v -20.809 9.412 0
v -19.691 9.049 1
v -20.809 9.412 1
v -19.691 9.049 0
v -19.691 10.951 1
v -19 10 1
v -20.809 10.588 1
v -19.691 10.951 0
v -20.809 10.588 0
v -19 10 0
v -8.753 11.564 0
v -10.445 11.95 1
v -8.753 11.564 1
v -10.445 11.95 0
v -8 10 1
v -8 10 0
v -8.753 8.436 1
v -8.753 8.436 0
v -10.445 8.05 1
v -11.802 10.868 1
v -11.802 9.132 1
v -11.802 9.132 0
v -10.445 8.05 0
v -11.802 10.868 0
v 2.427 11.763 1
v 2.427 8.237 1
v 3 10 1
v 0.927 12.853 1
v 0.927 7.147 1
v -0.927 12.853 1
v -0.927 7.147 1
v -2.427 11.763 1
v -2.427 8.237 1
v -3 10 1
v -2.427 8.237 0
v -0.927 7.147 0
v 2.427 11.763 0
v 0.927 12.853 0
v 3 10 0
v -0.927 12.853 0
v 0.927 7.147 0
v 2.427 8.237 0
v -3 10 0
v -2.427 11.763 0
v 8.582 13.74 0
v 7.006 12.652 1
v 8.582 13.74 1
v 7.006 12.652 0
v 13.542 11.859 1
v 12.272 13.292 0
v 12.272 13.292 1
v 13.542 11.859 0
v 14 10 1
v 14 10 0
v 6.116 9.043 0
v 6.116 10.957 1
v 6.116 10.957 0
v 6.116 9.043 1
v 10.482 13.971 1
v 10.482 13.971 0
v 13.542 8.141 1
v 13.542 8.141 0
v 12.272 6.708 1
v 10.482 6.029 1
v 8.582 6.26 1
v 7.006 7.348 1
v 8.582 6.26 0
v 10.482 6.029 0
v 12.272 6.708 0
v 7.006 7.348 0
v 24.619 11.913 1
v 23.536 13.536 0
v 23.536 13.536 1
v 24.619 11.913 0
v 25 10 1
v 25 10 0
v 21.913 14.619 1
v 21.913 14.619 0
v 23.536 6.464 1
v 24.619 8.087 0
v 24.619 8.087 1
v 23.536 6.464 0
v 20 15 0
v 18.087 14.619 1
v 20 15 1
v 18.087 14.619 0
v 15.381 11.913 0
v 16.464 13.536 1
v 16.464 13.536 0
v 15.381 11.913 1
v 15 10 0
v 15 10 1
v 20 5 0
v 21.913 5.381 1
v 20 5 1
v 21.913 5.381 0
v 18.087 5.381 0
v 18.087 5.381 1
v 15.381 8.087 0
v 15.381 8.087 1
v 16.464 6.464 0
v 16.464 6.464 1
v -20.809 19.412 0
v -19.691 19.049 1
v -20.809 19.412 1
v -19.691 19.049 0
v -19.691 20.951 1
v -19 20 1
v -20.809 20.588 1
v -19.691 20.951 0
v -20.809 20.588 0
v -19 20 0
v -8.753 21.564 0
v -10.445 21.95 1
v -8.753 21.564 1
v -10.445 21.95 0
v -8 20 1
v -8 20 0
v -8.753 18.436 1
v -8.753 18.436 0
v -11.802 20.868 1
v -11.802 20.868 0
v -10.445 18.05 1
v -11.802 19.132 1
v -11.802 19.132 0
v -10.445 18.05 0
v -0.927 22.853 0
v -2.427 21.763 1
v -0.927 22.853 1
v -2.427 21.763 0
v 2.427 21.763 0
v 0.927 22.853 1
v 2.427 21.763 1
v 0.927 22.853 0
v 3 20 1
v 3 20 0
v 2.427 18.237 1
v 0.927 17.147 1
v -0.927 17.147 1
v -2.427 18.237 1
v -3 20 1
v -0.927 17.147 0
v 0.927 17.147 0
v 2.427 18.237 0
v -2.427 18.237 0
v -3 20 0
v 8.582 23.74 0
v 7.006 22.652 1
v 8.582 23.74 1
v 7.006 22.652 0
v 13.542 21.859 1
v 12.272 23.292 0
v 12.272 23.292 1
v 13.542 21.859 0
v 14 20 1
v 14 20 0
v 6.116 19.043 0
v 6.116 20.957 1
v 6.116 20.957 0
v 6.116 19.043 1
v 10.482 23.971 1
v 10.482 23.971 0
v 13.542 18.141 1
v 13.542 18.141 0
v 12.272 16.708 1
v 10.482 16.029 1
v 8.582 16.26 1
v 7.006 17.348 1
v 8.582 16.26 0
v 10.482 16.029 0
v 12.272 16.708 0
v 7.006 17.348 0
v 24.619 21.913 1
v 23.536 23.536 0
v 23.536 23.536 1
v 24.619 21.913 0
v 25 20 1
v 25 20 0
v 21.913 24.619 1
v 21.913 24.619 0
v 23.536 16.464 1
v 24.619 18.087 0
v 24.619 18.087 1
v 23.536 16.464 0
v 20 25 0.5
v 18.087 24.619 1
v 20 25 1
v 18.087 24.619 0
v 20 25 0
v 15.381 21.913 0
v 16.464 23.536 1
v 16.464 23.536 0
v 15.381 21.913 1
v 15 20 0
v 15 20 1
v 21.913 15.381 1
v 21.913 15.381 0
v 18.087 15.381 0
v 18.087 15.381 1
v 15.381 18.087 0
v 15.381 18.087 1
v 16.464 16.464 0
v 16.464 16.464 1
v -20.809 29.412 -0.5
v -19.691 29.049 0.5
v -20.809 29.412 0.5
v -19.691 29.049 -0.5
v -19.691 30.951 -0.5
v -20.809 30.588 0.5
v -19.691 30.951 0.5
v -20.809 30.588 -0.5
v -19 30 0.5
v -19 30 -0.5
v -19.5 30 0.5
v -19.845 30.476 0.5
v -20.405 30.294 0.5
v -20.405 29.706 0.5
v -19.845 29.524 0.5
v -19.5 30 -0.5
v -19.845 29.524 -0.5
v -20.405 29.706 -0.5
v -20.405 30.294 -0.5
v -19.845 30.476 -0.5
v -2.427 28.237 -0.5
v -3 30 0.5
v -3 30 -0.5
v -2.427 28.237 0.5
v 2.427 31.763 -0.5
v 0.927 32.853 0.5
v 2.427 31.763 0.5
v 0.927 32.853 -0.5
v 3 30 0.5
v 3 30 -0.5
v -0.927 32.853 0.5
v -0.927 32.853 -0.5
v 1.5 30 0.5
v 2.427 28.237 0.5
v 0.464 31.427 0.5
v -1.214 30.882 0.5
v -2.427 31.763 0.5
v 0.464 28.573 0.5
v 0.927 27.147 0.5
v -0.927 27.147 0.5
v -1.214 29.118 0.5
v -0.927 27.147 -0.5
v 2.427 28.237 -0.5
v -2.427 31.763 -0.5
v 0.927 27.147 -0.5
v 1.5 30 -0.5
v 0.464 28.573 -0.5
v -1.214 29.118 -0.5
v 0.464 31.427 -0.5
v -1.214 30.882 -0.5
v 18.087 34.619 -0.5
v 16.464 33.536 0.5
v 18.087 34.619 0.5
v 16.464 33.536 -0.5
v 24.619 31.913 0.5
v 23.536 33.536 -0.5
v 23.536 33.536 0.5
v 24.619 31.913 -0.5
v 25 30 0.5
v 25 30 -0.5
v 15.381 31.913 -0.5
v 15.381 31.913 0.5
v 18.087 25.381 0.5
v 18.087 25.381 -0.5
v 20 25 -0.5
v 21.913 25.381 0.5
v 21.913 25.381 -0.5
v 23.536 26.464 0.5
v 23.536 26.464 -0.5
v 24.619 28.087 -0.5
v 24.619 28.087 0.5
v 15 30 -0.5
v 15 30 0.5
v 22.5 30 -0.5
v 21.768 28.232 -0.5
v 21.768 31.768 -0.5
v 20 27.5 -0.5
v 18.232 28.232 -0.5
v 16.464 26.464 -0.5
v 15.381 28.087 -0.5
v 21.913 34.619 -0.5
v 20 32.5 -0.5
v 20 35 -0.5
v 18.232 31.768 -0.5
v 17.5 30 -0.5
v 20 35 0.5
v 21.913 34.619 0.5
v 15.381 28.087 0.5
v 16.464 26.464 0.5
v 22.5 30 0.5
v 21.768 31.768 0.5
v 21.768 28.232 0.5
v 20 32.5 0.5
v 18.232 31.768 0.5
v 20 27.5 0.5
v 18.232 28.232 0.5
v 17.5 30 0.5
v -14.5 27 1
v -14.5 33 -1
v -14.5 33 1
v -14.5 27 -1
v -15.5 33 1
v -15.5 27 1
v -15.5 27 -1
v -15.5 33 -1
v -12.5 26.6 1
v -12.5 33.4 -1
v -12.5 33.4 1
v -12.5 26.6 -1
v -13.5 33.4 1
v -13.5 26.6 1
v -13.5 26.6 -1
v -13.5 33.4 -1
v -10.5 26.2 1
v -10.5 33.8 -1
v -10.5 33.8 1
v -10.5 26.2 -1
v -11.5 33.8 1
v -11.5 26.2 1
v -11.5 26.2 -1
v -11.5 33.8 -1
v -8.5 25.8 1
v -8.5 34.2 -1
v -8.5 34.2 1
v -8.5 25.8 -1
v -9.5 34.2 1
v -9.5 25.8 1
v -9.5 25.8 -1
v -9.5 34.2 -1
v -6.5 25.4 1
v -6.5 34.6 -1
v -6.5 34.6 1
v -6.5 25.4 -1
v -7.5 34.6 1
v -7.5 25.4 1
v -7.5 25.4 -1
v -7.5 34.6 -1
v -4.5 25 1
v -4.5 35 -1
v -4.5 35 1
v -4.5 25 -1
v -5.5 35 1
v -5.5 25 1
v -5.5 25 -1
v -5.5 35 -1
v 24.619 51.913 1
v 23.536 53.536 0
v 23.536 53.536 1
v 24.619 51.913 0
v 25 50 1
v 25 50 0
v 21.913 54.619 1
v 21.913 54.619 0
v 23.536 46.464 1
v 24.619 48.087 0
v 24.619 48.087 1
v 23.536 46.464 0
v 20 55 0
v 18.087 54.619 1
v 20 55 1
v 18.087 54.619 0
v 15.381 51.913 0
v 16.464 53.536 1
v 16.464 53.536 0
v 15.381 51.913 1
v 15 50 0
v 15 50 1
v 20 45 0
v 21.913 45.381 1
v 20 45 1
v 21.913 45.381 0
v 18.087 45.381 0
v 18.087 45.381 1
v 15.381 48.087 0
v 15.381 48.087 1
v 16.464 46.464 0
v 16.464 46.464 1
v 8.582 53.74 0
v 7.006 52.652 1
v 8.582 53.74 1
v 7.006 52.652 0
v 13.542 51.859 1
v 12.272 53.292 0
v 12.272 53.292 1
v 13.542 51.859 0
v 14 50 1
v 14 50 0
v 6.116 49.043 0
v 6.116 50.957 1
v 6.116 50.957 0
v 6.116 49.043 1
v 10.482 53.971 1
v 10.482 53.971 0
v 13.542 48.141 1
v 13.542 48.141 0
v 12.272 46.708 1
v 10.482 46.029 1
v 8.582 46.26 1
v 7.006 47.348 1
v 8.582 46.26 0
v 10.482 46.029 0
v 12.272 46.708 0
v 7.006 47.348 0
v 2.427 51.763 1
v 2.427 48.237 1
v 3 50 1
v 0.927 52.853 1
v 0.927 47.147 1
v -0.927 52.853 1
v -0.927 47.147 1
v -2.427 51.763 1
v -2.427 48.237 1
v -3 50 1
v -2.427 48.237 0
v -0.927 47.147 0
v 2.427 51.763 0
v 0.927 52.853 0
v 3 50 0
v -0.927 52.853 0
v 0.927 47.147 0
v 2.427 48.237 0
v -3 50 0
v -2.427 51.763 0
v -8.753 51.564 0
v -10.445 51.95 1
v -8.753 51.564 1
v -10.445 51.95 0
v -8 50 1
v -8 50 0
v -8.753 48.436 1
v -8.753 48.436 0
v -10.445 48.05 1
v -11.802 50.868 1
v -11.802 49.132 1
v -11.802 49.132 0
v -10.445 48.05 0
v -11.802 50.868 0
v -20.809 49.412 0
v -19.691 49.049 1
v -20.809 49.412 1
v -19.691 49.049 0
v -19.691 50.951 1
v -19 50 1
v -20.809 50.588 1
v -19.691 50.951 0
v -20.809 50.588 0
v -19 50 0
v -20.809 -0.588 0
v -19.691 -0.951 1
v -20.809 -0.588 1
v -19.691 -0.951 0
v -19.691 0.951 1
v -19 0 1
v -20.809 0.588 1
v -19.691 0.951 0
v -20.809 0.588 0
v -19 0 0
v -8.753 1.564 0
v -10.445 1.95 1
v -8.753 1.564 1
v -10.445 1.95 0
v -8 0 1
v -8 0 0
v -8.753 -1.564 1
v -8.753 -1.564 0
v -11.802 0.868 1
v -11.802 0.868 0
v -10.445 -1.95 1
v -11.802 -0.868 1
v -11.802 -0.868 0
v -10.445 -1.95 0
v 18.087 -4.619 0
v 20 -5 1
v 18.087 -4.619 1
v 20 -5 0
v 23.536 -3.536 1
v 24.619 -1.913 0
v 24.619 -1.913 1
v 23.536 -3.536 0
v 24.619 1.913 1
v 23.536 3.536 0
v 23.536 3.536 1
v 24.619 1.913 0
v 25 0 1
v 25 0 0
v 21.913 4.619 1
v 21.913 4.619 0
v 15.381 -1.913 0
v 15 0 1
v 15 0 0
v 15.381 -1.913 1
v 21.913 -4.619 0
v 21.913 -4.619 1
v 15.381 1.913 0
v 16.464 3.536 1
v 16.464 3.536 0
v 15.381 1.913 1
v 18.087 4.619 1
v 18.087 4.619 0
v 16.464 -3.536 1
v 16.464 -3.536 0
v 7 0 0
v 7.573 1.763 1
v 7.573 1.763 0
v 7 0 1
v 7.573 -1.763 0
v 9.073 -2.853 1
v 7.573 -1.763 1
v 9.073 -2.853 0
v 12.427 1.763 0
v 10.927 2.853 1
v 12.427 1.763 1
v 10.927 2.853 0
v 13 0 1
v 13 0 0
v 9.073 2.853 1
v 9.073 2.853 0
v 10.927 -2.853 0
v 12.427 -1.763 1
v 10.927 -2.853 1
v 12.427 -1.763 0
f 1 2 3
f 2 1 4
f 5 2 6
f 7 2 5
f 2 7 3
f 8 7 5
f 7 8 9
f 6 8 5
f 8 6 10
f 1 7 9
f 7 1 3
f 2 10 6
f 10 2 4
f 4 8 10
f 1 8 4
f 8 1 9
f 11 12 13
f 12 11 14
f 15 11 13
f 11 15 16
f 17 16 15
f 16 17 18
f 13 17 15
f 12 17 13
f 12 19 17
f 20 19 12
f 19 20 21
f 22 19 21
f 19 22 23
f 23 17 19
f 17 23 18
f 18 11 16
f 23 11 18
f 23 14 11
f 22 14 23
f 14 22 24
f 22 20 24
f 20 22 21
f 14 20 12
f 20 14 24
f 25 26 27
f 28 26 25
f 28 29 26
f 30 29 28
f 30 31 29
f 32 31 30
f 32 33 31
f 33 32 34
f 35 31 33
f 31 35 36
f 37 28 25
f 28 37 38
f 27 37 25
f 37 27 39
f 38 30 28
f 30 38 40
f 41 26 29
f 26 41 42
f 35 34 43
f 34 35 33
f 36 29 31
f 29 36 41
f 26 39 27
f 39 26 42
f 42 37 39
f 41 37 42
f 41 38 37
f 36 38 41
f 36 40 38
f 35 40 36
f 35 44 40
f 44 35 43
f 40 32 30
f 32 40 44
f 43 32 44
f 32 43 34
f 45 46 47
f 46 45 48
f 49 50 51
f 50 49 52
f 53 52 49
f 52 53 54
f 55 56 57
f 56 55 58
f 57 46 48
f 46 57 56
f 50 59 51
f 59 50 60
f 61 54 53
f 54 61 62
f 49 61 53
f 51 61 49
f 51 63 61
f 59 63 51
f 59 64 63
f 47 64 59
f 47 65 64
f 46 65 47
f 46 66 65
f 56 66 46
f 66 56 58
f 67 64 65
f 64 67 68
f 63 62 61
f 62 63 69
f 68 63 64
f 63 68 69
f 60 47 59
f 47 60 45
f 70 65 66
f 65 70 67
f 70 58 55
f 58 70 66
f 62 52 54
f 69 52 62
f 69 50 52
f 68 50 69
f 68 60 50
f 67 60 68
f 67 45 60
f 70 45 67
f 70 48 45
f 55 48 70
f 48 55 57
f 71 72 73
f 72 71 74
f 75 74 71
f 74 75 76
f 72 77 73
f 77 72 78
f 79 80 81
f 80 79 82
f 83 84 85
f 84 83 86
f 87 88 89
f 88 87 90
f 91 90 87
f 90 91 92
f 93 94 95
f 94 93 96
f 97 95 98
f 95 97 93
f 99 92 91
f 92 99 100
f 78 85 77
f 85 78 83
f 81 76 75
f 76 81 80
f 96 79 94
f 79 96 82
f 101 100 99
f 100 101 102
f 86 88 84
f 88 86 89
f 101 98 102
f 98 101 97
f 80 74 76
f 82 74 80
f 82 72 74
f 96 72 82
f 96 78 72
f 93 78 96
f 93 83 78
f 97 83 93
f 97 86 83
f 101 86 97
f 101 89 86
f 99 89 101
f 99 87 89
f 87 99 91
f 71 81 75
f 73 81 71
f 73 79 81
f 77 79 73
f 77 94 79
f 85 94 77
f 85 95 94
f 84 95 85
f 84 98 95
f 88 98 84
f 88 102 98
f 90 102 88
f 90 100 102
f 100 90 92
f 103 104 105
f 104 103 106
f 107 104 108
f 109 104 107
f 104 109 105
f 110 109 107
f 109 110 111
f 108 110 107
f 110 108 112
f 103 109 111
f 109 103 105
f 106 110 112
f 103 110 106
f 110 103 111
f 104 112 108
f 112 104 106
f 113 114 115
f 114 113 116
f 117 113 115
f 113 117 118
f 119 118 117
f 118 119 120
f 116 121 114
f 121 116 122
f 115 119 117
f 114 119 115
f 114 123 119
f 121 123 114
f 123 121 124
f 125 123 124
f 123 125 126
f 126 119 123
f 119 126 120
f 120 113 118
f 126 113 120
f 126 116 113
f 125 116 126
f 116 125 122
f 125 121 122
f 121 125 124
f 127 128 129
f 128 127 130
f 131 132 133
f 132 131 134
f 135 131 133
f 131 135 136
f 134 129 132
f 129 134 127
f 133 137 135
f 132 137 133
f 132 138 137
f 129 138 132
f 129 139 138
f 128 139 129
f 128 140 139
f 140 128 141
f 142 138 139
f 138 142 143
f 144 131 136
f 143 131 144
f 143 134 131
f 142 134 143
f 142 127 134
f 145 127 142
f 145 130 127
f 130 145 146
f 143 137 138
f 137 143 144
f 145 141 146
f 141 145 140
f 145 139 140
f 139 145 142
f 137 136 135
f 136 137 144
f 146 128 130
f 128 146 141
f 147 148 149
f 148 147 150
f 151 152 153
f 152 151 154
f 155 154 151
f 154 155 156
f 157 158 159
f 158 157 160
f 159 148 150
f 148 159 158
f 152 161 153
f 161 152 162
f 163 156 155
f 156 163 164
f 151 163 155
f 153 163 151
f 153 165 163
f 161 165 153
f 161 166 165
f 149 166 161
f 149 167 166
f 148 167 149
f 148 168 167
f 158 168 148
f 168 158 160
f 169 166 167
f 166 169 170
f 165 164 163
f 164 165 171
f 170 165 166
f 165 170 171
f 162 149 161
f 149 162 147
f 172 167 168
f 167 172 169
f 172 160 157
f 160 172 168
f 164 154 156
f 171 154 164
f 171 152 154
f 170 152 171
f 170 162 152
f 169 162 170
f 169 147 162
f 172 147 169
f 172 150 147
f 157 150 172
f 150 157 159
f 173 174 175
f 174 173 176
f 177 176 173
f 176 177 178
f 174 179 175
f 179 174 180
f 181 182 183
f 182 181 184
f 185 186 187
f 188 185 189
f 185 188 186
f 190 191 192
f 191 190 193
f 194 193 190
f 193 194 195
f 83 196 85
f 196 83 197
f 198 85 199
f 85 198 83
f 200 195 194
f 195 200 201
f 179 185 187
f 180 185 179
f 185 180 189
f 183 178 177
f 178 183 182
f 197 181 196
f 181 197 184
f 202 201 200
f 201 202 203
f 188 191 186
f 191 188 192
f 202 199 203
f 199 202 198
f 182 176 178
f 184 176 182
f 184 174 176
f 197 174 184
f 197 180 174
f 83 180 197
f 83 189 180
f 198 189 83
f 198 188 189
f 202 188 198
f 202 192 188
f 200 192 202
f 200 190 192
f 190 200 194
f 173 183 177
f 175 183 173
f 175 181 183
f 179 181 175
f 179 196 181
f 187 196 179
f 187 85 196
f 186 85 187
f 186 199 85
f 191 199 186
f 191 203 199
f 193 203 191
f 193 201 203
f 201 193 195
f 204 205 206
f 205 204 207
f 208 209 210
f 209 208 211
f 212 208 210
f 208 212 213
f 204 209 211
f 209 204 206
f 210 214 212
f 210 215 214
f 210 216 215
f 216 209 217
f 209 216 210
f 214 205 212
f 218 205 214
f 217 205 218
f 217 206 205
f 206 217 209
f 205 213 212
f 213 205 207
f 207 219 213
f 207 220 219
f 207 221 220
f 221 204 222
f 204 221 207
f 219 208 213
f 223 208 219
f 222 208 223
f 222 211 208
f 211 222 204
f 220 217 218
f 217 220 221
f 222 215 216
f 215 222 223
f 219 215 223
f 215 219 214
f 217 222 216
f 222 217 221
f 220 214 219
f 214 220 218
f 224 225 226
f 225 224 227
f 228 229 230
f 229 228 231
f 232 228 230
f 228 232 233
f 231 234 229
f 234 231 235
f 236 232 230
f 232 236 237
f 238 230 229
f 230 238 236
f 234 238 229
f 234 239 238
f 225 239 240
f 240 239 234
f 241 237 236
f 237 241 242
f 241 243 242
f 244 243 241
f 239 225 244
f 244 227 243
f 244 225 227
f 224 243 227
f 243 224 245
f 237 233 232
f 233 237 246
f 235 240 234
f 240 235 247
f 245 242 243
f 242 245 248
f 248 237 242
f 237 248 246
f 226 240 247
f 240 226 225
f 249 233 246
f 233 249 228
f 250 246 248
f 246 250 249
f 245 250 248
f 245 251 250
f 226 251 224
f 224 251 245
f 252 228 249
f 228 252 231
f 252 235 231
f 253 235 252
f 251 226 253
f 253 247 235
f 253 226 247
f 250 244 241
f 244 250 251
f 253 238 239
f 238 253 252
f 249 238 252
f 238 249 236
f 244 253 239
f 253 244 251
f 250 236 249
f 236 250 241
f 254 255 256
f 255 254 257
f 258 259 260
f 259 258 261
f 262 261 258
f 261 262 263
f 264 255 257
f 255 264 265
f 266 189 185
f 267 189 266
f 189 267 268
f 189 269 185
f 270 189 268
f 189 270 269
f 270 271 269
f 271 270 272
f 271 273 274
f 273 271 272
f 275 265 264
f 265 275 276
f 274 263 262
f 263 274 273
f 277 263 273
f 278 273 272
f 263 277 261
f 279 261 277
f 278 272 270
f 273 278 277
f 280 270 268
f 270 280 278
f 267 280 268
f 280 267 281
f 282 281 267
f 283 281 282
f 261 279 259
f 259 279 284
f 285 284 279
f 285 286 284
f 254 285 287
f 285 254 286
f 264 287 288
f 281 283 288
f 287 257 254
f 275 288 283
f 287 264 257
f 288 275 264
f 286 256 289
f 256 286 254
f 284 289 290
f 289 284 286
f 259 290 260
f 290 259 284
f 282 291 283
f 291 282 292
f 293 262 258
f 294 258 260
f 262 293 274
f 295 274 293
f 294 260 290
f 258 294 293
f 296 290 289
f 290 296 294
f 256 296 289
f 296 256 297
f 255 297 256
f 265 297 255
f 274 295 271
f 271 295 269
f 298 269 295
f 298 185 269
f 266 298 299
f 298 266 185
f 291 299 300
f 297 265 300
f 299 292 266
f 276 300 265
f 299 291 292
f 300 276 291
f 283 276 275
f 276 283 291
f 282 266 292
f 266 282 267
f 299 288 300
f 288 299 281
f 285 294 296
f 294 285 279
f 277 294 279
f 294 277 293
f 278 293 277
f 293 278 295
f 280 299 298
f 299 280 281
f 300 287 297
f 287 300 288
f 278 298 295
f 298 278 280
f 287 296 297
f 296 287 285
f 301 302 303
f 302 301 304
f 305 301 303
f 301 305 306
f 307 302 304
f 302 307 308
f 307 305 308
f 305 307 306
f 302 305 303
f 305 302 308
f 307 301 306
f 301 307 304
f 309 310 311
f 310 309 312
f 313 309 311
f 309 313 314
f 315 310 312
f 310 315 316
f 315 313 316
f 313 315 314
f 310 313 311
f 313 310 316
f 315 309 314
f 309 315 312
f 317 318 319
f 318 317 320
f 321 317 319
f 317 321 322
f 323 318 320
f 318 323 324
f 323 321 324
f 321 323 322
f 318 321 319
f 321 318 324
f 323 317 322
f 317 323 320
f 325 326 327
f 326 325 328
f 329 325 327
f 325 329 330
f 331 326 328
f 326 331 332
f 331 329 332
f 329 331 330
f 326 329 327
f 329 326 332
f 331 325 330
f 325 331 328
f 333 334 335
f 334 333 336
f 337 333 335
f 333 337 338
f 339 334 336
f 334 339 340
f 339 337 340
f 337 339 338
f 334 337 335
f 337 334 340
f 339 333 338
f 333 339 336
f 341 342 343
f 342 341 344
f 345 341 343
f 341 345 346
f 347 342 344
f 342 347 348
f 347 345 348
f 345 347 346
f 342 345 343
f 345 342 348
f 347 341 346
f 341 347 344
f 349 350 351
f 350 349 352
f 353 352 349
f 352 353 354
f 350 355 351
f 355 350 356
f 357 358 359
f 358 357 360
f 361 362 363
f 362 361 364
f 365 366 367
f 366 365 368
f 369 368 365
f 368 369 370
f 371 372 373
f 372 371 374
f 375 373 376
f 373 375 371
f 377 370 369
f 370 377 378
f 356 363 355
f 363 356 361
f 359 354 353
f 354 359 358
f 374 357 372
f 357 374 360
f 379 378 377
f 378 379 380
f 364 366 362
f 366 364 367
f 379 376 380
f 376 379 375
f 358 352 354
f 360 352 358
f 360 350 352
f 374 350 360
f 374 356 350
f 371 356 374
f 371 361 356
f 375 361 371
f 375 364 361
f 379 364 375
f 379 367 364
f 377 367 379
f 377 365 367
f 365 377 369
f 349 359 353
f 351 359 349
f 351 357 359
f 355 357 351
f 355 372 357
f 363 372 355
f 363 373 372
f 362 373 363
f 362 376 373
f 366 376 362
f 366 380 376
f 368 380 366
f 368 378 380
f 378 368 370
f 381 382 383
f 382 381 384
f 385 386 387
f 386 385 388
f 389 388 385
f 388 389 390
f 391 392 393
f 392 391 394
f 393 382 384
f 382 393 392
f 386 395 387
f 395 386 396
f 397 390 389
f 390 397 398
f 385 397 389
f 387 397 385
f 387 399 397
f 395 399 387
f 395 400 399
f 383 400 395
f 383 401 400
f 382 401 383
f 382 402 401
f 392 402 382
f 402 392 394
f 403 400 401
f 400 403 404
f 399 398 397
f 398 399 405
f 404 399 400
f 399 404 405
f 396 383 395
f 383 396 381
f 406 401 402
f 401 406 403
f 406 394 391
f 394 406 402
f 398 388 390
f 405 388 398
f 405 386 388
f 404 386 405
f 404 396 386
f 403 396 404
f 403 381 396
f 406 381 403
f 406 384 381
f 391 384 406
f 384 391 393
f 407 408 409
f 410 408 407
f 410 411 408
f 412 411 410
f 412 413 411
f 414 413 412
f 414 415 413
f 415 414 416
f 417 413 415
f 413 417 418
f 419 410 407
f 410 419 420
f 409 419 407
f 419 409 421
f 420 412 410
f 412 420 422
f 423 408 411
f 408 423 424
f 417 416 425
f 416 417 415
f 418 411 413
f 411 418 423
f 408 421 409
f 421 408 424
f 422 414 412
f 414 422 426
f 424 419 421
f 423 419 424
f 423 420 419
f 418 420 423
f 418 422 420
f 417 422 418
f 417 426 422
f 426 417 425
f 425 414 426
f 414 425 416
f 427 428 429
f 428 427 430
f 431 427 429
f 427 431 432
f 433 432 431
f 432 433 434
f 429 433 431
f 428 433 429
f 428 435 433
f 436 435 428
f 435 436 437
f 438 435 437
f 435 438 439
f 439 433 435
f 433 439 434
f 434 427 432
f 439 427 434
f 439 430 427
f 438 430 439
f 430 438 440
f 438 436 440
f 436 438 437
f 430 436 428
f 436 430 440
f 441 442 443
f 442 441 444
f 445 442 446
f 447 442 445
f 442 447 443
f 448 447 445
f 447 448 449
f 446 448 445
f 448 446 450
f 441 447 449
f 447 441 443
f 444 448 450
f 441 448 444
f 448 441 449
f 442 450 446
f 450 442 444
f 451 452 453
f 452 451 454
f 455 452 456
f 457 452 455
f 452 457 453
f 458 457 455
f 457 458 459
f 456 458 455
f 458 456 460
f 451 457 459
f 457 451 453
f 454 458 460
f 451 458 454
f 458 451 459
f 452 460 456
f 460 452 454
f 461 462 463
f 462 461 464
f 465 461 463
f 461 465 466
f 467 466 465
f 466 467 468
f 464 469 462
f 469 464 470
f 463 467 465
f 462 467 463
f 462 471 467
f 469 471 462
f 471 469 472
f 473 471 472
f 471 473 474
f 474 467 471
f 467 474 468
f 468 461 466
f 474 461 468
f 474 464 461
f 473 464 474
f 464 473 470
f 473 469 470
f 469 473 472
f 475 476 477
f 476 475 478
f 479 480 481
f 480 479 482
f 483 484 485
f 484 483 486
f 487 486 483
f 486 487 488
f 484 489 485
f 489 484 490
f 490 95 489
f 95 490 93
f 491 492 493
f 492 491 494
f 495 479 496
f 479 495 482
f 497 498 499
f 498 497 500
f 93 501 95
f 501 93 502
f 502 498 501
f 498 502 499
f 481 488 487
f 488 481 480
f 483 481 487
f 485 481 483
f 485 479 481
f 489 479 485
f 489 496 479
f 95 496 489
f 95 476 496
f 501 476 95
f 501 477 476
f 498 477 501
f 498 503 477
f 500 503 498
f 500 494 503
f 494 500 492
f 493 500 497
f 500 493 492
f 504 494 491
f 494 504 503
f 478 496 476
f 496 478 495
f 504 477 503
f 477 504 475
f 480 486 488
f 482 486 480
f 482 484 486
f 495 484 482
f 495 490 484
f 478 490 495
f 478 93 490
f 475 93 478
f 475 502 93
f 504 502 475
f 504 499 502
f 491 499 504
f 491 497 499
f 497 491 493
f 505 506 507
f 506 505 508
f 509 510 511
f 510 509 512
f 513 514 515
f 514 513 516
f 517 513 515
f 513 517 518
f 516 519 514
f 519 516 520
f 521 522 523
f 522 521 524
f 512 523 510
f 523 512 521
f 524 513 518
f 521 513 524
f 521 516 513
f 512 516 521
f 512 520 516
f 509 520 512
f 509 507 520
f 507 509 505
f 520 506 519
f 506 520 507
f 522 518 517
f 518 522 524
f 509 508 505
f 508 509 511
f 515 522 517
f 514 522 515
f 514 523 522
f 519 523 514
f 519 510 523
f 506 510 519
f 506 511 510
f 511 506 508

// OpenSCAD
// Empty
for();
// No children
for(i=2) { }
// Modifier and no children
%for(i=2) { }
#for(i=2) { }

// Null
translate([-10,0,0]) for() cylinder(r=4);

// Scalar
translate([10,0,0]) for(i=3) cylinder(r=i);

// Range
for(r=[1:5]) translate([r*10-30,10,0]) cylinder(r=r);

// Reverse
for(r=[5:1]) translate([r*10-30,20,0]) cylinder(r=r);

// Step
for(r=[1:2:6]) translate([r*10-30,30,0]) difference() {cylinder(r=r, center=true); cylinder(r=r/2, h=2, center=true);}

// Fractional step
for(r=[1.5:0.2:2.5]) translate([r*10-30,30,0]) cube([1, 4*r, 2], center=true);

// Negative range, negative step
for(r=[5:-1:1]) translate([r*10-30,50,0]) cylinder(r=r);

// Negative range, positive step
for(r=[5:1:1]) translate([r*10-30,40,0]) cylinder(r=r);

// Zero step

for(r=[1:0:5]) translate([r*10+60,40,0]) cylinder(r=r);

// Negative step
for(r=[1:-1:5]) translate([r*10-30,50,0]) cylinder(r=r);

// Illegal step value
for(r=[1:true:5]) translate([r*10-60,50,0]) cylinder(r=r);

// Vector
for(r=[1,2,5]) translate([r*10-30,0,0]) cylinder(r=r);

// String
for(c="") echo("never shown");
for(c="a\u2191b\U01f600") echo(c);

nan = 0/0;
inf = 1/0;
ninf = -1/0;

echo(nan);
echo(inf);
echo(ninf);

// validate step values
for(i=[0:nan:0]) { echo("NAN", i); }
for(i=[0:inf:0]) { echo("INF", i); }
for(i=[0:ninf:0]) { echo("-INF", i); }

for(i=[0:nan:1]) { echo("NAN", i); }
for(i=[0:inf:1]) { echo("INF", i); }
for(i=[0:ninf:1]) { echo("-INF", i); }

for(i=[1:nan:0]) { echo("NAN", i); }
for(i=[1:inf:0]) { echo("INF", i); }
for(i=[1:ninf:0]) { echo("-INF", i); }

// validate begin / end values
for(i = [0:inf]) {}
for(i = [0:ninf]) {}      // empty set
for(i = [inf:0]) {}       // empty set
for(i = [ninf:0]) {}

for(i = [0:2:inf]) {}
for(i = [0:2:ninf]) {}    // 0 values, begin > end
for(i = [inf:2:0]) {}     // 0 values, begin > end
for(i = [ninf:2:0]) {}
for(i = [inf:2:inf]) {}   // 1 value,  begin == end
for(i = [ninf:2:ninf]) {} // 1 value,  begin == end
for(i = [inf:2:ninf]) {}  // 0 values, begin > end
for(i = [ninf:2:inf]) {}

module PathologicalInputs() {
  // Expected:  too many elements
  // Actual:  0
  echo("[0:1:4294967296] end capped");
  for (i=[0:1:4294967296]) { if ((i<2) || (i>=4294967295)) {echo(i);} }

  // Expected:  too many elements
  // Actual:  0
  echo("[0:1:8589934592] end capped");
  for (i=[0:1:8589934592]) { if ((i<2) || (i>=8589934592)) {echo(i);} }

  // Expected:  0, 1, 4294967294, 4294967295  or too many inputs
  // Actual:  no output
  echo("[0:1:4294967295] end capped");
  for (i=[0:1:4294967295]) { if ((i<2) || (i>=4294967294)) {echo(i);} }

  // Expected:  0, 1, 4294967293, 4294967294  or too many inputs
  // Actual:  too many elements (4294967295)
  // Note:  Oddly inconsistent with the 0:42949679295 case right above.
  echo("[0:1:4294967294] end capped");
  for (i=[0:1:4294967294]) { if ((i<2) || (i>=4294967293)) {echo(i);} }

  // Expected:  0, 1, 4999, 5000
  // Correct
  echo("[0:1:5000] end capped");
  for (i=[0:1:5000]) { if ((i<2) || (i>=4999)) {echo(i);} }

  // Expected:  "diff=0, i==1", "diff=0, i=5000"
  // Correct
  echo("[0:1:5000] difference from 1, 5000");
  for (i=[0:1:5000]) {
    if ((i>0.5)&&(i<1.5)) {
      echo("diff=", i-1, (i==1)?", i==1":", i!=1");
    }
    if (i>4999) {
      echo("diff=", i-5000, (i==5000)?", i==5000":", i!=5000");
    }
  }

  // Expected:  "diff=0, i==1", "diff=0, i=5000"
  // Correct
  echo("[0:1:5000] difference from 1, 5000");
  for (i=[0:1:5000]) {
    if ((i>0.5)&&(i<1.5)) {
      echo("diff=", i-1, (i==1)?", i==1":", i!=1");
    }
    if (i>4999) {
      echo("diff=", i-5000, (i==5000)?", i==5000":", i!=5000");
    }
  }

  // Expected:  "diff=0, i==1"
  // Correct
  echo("[0:1] difference from 1");
  for (i=[0:1])
    if (i>0) {
      echo("diff=", i-1, (i==1)?", i==1":", i!=1");
    }
}

PathologicalInputs();
